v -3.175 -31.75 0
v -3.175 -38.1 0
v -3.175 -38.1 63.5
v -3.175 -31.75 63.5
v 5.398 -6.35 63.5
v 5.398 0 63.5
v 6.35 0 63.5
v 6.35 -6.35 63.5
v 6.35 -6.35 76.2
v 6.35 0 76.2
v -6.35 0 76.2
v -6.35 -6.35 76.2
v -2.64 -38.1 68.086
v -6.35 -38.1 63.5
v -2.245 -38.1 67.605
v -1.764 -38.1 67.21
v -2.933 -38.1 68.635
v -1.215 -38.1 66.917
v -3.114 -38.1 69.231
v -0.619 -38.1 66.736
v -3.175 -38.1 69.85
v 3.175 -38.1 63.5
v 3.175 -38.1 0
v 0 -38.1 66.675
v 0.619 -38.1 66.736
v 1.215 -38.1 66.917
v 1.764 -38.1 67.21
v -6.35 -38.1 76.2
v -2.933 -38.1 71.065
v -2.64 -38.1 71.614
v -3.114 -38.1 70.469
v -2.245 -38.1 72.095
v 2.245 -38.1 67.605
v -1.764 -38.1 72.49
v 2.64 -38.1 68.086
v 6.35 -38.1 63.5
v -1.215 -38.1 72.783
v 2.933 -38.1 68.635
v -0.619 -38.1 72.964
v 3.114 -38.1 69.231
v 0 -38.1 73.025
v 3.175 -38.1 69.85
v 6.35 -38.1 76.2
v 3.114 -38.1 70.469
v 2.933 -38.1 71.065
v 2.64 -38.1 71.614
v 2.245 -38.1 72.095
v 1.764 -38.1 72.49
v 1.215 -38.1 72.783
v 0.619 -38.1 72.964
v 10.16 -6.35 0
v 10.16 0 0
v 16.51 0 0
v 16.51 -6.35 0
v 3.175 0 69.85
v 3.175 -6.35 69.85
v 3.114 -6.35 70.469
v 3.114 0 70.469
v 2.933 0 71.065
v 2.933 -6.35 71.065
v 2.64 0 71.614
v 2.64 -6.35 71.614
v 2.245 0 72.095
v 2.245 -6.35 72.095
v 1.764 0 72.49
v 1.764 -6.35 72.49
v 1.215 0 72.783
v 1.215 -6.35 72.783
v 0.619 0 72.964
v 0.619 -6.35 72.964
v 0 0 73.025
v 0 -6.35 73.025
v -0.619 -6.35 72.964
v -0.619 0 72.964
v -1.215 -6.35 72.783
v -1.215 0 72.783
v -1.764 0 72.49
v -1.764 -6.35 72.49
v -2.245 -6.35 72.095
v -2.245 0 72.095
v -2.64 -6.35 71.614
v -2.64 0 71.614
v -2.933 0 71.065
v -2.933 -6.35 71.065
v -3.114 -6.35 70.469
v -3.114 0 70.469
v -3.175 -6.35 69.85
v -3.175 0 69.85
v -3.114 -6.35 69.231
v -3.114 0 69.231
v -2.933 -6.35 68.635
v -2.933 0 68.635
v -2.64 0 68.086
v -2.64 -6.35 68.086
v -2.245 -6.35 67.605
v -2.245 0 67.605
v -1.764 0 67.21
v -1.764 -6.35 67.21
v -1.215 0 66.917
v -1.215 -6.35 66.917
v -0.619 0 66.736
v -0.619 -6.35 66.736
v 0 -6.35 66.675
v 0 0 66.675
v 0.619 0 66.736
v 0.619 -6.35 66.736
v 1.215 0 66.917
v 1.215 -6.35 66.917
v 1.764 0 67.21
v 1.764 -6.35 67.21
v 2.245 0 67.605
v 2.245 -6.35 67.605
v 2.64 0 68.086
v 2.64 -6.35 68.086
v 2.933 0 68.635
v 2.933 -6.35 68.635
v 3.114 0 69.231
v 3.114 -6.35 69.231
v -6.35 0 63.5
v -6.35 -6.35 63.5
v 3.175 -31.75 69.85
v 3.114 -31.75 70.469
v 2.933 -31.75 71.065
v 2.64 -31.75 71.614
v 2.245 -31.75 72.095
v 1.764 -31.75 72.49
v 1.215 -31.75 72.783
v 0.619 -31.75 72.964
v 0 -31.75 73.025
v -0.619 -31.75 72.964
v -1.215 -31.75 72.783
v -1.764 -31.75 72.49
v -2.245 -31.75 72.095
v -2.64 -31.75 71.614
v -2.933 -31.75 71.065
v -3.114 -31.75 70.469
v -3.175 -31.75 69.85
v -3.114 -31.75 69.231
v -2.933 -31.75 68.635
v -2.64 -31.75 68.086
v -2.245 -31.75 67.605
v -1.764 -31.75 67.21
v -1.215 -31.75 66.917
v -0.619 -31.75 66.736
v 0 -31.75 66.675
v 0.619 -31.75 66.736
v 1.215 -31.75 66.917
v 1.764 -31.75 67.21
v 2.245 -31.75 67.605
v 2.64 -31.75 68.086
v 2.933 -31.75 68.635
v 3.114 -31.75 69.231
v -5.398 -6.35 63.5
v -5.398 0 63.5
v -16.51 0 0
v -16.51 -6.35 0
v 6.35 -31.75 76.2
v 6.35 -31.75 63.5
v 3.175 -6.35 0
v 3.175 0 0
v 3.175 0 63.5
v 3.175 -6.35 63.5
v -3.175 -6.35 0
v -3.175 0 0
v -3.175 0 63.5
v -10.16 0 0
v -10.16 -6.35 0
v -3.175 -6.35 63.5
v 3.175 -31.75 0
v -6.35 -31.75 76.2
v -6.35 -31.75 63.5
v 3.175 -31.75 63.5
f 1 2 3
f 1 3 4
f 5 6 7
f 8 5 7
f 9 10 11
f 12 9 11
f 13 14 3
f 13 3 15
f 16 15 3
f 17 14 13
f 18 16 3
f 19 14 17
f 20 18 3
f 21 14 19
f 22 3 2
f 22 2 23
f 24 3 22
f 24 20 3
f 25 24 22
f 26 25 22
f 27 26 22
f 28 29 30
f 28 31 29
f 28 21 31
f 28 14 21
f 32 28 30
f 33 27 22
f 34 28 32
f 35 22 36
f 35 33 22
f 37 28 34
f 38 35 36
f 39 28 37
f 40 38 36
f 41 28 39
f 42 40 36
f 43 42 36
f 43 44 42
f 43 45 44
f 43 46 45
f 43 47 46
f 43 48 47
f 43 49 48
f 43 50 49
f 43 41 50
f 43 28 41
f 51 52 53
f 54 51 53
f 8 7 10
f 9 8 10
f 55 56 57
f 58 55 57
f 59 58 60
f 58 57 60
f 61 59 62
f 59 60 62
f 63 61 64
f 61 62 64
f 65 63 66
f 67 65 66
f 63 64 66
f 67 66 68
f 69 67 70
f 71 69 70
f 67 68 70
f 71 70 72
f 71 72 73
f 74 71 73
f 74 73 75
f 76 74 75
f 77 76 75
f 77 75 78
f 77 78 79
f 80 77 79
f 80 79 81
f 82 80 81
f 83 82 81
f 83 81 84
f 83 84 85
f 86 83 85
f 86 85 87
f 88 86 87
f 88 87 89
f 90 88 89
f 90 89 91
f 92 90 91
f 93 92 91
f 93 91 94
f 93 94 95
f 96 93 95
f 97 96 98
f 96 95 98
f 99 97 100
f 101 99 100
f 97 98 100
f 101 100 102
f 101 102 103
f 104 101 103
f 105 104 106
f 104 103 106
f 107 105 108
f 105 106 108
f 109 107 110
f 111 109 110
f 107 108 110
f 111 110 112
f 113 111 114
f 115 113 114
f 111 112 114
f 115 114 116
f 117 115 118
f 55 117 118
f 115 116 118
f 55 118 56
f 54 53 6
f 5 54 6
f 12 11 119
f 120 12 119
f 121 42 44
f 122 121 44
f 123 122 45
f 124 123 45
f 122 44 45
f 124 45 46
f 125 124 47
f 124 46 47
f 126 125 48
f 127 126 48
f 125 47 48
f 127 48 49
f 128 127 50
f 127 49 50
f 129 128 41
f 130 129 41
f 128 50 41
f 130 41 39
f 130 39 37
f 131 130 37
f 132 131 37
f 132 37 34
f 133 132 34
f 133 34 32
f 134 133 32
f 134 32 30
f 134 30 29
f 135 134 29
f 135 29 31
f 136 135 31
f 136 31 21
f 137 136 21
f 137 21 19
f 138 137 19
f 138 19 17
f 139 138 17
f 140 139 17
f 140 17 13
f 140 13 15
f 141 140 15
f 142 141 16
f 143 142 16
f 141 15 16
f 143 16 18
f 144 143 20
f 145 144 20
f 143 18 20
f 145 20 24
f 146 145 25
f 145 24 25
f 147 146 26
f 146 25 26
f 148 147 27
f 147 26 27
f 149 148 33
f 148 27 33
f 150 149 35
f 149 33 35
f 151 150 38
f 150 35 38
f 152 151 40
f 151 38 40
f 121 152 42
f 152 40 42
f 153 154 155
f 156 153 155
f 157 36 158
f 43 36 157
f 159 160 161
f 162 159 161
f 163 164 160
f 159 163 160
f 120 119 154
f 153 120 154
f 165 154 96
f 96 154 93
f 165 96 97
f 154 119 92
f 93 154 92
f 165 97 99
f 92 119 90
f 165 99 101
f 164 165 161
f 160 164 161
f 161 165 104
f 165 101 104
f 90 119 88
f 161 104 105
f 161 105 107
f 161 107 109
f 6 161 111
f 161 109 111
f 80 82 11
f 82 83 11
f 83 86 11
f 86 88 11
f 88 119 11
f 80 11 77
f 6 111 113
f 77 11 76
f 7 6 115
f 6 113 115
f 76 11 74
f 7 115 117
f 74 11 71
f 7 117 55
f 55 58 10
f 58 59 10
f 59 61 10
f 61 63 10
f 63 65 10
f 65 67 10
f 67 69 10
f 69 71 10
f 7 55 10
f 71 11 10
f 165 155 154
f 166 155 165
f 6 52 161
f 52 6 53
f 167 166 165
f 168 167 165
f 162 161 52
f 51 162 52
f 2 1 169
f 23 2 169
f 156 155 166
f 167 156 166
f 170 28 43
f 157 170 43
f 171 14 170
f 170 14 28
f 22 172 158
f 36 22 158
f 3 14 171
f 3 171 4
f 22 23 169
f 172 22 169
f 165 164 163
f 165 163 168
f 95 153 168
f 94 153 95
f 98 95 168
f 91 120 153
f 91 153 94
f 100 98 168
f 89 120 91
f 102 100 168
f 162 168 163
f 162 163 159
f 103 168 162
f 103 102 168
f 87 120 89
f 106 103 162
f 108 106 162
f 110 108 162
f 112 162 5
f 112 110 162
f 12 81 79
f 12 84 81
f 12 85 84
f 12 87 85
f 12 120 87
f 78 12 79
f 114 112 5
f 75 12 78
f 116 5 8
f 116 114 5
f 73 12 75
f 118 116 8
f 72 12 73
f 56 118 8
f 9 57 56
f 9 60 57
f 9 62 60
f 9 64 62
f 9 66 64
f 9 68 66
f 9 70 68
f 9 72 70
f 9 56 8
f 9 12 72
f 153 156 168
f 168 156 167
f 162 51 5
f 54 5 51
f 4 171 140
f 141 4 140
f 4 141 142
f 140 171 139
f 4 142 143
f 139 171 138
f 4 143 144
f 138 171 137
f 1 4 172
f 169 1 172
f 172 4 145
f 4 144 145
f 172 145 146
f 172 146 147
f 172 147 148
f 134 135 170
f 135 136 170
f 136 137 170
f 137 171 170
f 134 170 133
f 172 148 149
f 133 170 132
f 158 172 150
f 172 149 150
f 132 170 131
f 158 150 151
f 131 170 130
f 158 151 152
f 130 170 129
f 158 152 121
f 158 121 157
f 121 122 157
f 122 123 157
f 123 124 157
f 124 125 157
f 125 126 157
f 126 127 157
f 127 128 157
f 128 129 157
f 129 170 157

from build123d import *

# Parameters (mm, degrees)
F0_W      = 6.35
F0_H      = 76.2
F1_DEPTH  = 6.35
F3_DEPTH  = 6.35
F5_DEPTH  = 6.35
F6_R      = 3.175
F7_DEPTH  = 25.4
F8_W      = 6.35
F8_H      = 6.35
F9_DEPTH  = 76.2
F10_W     = 12.7
F10_H     = 12.7
F10_R     = 3.175
F11_DEPTH = 6.35
F12_R     = 3.175
F13_DEPTH = 25.4


with BuildPart() as f1:
    # F0 (on Front) → F1 (new body)
    with BuildSketch(Plane.XZ):
        with Locations((0, 38.1)):
            Rectangle(F0_W, F0_H)
    extrude(amount=F1_DEPTH)

    # F2 (on Front) → F3 (join)
    with BuildSketch(Plane.XZ):
        Polygon((-3.175, 63.5), (-3.175, 76.2), (-16.51, 0), (-10.16, 0), align=None)
        Polygon((16.51, 0), (3.175, 76.2), (3.175, 63.5), (10.16, 0), align=None)
    extrude(amount=F3_DEPTH)

    # F4 (on Front) → F5 (join)
    with BuildSketch(Plane.XZ):
        Polygon((-6.35, 63.5), (0, 63.5), (6.35, 63.5), (6.35, 76.2), (3.175, 76.2), (-3.175, 76.2), (-6.35, 76.2), align=None)
    extrude(amount=F5_DEPTH)

    # F6 (on face) → F7 (cut)
    with BuildSketch(Plane.XZ.offset(6.35)):
        with Locations((0, 69.85)):
            Circle(F6_R)
    extrude(amount=-F7_DEPTH, mode=Mode.SUBTRACT)


with BuildPart() as f9:
    # F8 (on Top) → F9 (new body)
    with BuildSketch(Plane.XY):
        with Locations((0, -34.925)):
            Rectangle(F8_W, F8_H)
    extrude(amount=F9_DEPTH)

    # F10 (on face) → F11 (join)
    with BuildSketch(Plane.XZ.offset(38.1)):
        with Locations((0, 69.85)):
            Rectangle(F10_W, F10_H)
        with Locations((0, 69.85)):
            Circle(F10_R, mode=Mode.SUBTRACT)
    extrude(amount=-F11_DEPTH)

    # F12 (on face) → F13 (cut)
    with BuildSketch(Plane.XZ.offset(38.1)):
        with Locations((0, 69.85)):
            Circle(F12_R)
    extrude(amount=-F13_DEPTH, mode=Mode.SUBTRACT)


solid = Compound([f1.part, f9.part])
